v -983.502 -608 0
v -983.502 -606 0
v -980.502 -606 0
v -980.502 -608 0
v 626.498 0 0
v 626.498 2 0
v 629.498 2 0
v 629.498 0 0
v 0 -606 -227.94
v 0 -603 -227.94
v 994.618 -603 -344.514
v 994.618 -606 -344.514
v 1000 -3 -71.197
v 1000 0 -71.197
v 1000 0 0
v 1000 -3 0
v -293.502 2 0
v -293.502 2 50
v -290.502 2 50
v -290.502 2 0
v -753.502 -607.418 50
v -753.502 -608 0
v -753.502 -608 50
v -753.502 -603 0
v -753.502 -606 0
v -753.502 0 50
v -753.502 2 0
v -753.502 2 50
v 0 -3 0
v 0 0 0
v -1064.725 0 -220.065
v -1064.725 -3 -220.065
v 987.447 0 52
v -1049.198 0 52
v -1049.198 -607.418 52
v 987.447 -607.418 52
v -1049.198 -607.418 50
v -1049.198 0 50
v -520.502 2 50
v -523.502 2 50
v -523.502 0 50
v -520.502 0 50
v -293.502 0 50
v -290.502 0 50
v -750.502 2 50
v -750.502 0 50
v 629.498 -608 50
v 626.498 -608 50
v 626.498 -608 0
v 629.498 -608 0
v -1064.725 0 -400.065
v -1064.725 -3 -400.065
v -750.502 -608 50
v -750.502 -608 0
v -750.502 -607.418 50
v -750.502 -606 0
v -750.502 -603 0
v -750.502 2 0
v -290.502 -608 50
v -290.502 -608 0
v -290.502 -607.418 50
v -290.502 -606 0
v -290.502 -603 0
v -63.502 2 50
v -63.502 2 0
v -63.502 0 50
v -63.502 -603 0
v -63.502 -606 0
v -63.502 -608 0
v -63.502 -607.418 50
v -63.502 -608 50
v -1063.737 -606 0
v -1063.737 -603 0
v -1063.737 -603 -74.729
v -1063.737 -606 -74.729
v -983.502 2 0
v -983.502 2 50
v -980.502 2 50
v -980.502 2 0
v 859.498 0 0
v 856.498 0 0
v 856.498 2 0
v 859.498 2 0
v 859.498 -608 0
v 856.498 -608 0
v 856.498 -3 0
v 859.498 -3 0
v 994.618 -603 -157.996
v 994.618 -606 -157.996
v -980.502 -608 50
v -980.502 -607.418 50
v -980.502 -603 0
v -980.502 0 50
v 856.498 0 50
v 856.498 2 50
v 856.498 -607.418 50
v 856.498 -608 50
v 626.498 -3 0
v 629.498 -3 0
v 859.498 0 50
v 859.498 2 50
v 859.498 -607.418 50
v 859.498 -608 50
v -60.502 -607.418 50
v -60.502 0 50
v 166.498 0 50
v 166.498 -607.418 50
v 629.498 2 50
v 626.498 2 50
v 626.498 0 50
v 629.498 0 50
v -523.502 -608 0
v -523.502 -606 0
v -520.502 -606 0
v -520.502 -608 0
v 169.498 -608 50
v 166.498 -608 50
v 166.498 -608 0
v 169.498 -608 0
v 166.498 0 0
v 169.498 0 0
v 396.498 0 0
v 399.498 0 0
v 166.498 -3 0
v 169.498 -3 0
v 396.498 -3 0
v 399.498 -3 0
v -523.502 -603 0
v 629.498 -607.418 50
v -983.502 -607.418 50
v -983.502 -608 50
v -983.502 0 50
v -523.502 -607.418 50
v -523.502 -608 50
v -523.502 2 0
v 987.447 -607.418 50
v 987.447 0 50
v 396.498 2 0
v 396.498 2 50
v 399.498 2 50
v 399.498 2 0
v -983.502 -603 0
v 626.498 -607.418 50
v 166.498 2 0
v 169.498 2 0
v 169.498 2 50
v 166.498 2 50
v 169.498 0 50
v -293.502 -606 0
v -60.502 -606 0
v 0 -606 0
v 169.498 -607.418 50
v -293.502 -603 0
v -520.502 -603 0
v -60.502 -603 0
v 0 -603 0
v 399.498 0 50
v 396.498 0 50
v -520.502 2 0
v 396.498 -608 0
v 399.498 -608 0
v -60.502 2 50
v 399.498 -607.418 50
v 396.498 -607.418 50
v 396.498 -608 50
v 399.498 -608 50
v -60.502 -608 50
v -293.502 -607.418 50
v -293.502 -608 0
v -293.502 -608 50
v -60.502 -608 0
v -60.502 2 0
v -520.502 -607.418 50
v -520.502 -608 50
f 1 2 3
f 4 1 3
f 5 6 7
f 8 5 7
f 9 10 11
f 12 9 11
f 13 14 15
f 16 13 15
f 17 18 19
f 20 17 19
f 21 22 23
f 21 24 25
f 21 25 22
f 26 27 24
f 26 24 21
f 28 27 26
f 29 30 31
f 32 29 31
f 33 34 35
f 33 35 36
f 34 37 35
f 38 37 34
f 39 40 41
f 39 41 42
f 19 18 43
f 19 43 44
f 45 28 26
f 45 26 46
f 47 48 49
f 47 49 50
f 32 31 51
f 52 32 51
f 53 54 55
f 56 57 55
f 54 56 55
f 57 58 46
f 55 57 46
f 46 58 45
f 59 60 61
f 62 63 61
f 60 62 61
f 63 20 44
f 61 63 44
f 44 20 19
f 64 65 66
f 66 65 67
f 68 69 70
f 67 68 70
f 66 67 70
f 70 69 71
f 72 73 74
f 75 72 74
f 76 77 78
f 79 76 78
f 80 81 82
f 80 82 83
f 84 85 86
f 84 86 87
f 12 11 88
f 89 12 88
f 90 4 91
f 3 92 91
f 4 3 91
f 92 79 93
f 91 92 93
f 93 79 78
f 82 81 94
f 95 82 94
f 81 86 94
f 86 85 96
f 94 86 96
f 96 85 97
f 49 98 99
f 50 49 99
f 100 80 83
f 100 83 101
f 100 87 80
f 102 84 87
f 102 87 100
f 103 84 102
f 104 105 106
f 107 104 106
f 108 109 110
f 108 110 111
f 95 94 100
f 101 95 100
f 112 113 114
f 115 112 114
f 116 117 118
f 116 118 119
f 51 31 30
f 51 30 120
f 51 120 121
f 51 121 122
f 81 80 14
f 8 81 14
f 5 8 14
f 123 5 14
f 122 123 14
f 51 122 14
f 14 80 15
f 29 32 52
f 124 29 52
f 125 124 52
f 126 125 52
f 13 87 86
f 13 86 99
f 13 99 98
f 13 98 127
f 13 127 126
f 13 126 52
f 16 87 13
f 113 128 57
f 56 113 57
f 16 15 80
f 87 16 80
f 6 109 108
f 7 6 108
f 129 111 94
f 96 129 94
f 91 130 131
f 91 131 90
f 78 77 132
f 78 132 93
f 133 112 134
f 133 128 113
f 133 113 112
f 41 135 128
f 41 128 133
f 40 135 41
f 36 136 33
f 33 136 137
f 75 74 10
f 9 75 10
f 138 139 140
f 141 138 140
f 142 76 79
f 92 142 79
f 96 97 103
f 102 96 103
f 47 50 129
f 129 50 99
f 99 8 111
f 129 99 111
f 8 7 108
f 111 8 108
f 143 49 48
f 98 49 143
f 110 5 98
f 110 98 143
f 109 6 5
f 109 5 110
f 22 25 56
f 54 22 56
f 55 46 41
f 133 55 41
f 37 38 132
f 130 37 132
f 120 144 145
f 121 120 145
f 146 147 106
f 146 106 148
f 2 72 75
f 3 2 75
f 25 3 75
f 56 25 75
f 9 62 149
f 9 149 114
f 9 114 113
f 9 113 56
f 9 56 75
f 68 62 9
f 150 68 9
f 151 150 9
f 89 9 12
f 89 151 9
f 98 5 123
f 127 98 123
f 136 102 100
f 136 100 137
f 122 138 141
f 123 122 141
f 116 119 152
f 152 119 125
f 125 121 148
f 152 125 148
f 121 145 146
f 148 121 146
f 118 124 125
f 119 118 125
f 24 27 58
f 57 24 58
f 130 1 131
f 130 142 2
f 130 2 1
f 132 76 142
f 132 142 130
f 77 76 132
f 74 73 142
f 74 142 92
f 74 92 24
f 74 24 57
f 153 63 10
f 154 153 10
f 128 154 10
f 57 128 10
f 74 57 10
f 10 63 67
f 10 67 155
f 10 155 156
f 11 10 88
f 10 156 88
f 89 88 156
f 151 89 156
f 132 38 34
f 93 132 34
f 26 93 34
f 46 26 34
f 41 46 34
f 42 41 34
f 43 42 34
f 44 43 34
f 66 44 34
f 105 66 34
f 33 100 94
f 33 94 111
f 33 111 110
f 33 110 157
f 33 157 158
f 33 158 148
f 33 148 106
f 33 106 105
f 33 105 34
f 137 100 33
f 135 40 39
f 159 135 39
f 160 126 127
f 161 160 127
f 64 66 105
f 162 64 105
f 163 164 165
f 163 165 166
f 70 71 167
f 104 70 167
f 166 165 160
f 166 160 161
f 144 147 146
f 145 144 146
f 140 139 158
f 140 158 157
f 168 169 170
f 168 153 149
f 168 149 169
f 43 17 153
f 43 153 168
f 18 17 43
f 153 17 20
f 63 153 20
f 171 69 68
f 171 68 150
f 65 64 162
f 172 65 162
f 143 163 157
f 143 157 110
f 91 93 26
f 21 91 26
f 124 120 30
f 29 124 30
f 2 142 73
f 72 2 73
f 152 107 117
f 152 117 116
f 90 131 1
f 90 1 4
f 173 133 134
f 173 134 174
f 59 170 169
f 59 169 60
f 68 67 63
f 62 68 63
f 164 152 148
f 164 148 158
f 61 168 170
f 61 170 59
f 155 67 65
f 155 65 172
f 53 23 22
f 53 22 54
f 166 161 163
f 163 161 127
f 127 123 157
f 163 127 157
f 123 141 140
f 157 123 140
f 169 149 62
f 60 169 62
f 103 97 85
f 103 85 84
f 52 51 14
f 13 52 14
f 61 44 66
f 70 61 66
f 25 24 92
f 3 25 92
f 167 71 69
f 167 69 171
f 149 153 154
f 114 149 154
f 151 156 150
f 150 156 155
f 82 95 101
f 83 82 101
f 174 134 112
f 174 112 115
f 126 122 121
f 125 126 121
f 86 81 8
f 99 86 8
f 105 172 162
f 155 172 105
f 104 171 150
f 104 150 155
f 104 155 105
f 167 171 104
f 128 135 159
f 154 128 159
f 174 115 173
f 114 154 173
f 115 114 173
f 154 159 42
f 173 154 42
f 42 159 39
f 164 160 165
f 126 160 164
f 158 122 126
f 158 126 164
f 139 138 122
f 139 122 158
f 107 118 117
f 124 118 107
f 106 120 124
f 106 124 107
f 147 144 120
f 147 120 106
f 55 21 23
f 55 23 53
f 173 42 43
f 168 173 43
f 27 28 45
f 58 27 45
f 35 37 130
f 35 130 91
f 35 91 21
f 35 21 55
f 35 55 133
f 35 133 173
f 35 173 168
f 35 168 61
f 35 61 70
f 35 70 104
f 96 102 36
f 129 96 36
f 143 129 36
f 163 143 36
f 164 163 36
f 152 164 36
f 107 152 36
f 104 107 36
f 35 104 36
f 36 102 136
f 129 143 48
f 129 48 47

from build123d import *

# Parameters (mm, degrees)
F1_DEPTH = 3
F4_DEPTH = 3
F6_W     = 3
F6_H     = 50
F7_DEPTH = 305
F8_W     = 2036.6446971893
F8_H     = 607.4184775352
F9_DEPTH = 2


with BuildPart() as f1:
    # F0 (on Front) → F1 (new body)
    with BuildSketch(Plane.XZ):
        Polygon((1000, 0), (0, 0), (-1064.7249259854, -220.0647401601), (-1064.7249259854, -400.0647401601), (1000, -71.1974114174), align=None)
    extrude(amount=F1_DEPTH)

    # F6 (on offset) → F7, piece 2 (join, symmetric)
    with BuildSketch(Plane.XZ.offset(303)):
        with Locations((167.9982813472, 25)):
            Rectangle(F6_W, F6_H)
        with Locations((397.9982813472, 25)):
            Rectangle(F6_W, F6_H)
        with Locations((627.9982813472, 25)):
            Rectangle(F6_W, F6_H)
        with Locations((857.9982813472, 25)):
            Rectangle(F6_W, F6_H)
    extrude(amount=F7_DEPTH, both=True)



with BuildPart() as f4:
    # F3 (on offset) → F4 (new body)
    with BuildSketch(Plane.XZ.offset(603)):
        Polygon((994.6181178093, -157.9961776733), (0, 0), (-1063.7367963791, 0), (-1063.7367963791, -74.729397893), (0, -227.9402762651), (994.6181178093, -344.5137739182), align=None)
    extrude(amount=F4_DEPTH)

    # F6 (on offset) → F7 (join, symmetric)
    with BuildSketch(Plane.XZ.offset(303)):
        with Locations((-982.0017186528, 25)):
            Rectangle(F6_W, F6_H)
        with Locations((-752.0017186528, 25)):
            Rectangle(F6_W, F6_H)
        with Locations((-522.0017186528, 25)):
            Rectangle(F6_W, F6_H)
        with Locations((-292.0017186528, 25)):
            Rectangle(F6_W, F6_H)
        with Locations((-62.0017186528, 25)):
            Rectangle(F6_W, F6_H)
    extrude(amount=F7_DEPTH, both=True)


with BuildPart() as f1_1:
    add(f1.part)

    add(f4.part)  # F9 merges F4
    # F8 (on face) → F9 (join)
    with BuildSketch(Plane.XY.offset(50)):
        with Locations((-30.8758020401, -303.7092387676)):
            Rectangle(F8_W, F8_H)
    extrude(amount=F9_DEPTH)


solid = f1_1.part
